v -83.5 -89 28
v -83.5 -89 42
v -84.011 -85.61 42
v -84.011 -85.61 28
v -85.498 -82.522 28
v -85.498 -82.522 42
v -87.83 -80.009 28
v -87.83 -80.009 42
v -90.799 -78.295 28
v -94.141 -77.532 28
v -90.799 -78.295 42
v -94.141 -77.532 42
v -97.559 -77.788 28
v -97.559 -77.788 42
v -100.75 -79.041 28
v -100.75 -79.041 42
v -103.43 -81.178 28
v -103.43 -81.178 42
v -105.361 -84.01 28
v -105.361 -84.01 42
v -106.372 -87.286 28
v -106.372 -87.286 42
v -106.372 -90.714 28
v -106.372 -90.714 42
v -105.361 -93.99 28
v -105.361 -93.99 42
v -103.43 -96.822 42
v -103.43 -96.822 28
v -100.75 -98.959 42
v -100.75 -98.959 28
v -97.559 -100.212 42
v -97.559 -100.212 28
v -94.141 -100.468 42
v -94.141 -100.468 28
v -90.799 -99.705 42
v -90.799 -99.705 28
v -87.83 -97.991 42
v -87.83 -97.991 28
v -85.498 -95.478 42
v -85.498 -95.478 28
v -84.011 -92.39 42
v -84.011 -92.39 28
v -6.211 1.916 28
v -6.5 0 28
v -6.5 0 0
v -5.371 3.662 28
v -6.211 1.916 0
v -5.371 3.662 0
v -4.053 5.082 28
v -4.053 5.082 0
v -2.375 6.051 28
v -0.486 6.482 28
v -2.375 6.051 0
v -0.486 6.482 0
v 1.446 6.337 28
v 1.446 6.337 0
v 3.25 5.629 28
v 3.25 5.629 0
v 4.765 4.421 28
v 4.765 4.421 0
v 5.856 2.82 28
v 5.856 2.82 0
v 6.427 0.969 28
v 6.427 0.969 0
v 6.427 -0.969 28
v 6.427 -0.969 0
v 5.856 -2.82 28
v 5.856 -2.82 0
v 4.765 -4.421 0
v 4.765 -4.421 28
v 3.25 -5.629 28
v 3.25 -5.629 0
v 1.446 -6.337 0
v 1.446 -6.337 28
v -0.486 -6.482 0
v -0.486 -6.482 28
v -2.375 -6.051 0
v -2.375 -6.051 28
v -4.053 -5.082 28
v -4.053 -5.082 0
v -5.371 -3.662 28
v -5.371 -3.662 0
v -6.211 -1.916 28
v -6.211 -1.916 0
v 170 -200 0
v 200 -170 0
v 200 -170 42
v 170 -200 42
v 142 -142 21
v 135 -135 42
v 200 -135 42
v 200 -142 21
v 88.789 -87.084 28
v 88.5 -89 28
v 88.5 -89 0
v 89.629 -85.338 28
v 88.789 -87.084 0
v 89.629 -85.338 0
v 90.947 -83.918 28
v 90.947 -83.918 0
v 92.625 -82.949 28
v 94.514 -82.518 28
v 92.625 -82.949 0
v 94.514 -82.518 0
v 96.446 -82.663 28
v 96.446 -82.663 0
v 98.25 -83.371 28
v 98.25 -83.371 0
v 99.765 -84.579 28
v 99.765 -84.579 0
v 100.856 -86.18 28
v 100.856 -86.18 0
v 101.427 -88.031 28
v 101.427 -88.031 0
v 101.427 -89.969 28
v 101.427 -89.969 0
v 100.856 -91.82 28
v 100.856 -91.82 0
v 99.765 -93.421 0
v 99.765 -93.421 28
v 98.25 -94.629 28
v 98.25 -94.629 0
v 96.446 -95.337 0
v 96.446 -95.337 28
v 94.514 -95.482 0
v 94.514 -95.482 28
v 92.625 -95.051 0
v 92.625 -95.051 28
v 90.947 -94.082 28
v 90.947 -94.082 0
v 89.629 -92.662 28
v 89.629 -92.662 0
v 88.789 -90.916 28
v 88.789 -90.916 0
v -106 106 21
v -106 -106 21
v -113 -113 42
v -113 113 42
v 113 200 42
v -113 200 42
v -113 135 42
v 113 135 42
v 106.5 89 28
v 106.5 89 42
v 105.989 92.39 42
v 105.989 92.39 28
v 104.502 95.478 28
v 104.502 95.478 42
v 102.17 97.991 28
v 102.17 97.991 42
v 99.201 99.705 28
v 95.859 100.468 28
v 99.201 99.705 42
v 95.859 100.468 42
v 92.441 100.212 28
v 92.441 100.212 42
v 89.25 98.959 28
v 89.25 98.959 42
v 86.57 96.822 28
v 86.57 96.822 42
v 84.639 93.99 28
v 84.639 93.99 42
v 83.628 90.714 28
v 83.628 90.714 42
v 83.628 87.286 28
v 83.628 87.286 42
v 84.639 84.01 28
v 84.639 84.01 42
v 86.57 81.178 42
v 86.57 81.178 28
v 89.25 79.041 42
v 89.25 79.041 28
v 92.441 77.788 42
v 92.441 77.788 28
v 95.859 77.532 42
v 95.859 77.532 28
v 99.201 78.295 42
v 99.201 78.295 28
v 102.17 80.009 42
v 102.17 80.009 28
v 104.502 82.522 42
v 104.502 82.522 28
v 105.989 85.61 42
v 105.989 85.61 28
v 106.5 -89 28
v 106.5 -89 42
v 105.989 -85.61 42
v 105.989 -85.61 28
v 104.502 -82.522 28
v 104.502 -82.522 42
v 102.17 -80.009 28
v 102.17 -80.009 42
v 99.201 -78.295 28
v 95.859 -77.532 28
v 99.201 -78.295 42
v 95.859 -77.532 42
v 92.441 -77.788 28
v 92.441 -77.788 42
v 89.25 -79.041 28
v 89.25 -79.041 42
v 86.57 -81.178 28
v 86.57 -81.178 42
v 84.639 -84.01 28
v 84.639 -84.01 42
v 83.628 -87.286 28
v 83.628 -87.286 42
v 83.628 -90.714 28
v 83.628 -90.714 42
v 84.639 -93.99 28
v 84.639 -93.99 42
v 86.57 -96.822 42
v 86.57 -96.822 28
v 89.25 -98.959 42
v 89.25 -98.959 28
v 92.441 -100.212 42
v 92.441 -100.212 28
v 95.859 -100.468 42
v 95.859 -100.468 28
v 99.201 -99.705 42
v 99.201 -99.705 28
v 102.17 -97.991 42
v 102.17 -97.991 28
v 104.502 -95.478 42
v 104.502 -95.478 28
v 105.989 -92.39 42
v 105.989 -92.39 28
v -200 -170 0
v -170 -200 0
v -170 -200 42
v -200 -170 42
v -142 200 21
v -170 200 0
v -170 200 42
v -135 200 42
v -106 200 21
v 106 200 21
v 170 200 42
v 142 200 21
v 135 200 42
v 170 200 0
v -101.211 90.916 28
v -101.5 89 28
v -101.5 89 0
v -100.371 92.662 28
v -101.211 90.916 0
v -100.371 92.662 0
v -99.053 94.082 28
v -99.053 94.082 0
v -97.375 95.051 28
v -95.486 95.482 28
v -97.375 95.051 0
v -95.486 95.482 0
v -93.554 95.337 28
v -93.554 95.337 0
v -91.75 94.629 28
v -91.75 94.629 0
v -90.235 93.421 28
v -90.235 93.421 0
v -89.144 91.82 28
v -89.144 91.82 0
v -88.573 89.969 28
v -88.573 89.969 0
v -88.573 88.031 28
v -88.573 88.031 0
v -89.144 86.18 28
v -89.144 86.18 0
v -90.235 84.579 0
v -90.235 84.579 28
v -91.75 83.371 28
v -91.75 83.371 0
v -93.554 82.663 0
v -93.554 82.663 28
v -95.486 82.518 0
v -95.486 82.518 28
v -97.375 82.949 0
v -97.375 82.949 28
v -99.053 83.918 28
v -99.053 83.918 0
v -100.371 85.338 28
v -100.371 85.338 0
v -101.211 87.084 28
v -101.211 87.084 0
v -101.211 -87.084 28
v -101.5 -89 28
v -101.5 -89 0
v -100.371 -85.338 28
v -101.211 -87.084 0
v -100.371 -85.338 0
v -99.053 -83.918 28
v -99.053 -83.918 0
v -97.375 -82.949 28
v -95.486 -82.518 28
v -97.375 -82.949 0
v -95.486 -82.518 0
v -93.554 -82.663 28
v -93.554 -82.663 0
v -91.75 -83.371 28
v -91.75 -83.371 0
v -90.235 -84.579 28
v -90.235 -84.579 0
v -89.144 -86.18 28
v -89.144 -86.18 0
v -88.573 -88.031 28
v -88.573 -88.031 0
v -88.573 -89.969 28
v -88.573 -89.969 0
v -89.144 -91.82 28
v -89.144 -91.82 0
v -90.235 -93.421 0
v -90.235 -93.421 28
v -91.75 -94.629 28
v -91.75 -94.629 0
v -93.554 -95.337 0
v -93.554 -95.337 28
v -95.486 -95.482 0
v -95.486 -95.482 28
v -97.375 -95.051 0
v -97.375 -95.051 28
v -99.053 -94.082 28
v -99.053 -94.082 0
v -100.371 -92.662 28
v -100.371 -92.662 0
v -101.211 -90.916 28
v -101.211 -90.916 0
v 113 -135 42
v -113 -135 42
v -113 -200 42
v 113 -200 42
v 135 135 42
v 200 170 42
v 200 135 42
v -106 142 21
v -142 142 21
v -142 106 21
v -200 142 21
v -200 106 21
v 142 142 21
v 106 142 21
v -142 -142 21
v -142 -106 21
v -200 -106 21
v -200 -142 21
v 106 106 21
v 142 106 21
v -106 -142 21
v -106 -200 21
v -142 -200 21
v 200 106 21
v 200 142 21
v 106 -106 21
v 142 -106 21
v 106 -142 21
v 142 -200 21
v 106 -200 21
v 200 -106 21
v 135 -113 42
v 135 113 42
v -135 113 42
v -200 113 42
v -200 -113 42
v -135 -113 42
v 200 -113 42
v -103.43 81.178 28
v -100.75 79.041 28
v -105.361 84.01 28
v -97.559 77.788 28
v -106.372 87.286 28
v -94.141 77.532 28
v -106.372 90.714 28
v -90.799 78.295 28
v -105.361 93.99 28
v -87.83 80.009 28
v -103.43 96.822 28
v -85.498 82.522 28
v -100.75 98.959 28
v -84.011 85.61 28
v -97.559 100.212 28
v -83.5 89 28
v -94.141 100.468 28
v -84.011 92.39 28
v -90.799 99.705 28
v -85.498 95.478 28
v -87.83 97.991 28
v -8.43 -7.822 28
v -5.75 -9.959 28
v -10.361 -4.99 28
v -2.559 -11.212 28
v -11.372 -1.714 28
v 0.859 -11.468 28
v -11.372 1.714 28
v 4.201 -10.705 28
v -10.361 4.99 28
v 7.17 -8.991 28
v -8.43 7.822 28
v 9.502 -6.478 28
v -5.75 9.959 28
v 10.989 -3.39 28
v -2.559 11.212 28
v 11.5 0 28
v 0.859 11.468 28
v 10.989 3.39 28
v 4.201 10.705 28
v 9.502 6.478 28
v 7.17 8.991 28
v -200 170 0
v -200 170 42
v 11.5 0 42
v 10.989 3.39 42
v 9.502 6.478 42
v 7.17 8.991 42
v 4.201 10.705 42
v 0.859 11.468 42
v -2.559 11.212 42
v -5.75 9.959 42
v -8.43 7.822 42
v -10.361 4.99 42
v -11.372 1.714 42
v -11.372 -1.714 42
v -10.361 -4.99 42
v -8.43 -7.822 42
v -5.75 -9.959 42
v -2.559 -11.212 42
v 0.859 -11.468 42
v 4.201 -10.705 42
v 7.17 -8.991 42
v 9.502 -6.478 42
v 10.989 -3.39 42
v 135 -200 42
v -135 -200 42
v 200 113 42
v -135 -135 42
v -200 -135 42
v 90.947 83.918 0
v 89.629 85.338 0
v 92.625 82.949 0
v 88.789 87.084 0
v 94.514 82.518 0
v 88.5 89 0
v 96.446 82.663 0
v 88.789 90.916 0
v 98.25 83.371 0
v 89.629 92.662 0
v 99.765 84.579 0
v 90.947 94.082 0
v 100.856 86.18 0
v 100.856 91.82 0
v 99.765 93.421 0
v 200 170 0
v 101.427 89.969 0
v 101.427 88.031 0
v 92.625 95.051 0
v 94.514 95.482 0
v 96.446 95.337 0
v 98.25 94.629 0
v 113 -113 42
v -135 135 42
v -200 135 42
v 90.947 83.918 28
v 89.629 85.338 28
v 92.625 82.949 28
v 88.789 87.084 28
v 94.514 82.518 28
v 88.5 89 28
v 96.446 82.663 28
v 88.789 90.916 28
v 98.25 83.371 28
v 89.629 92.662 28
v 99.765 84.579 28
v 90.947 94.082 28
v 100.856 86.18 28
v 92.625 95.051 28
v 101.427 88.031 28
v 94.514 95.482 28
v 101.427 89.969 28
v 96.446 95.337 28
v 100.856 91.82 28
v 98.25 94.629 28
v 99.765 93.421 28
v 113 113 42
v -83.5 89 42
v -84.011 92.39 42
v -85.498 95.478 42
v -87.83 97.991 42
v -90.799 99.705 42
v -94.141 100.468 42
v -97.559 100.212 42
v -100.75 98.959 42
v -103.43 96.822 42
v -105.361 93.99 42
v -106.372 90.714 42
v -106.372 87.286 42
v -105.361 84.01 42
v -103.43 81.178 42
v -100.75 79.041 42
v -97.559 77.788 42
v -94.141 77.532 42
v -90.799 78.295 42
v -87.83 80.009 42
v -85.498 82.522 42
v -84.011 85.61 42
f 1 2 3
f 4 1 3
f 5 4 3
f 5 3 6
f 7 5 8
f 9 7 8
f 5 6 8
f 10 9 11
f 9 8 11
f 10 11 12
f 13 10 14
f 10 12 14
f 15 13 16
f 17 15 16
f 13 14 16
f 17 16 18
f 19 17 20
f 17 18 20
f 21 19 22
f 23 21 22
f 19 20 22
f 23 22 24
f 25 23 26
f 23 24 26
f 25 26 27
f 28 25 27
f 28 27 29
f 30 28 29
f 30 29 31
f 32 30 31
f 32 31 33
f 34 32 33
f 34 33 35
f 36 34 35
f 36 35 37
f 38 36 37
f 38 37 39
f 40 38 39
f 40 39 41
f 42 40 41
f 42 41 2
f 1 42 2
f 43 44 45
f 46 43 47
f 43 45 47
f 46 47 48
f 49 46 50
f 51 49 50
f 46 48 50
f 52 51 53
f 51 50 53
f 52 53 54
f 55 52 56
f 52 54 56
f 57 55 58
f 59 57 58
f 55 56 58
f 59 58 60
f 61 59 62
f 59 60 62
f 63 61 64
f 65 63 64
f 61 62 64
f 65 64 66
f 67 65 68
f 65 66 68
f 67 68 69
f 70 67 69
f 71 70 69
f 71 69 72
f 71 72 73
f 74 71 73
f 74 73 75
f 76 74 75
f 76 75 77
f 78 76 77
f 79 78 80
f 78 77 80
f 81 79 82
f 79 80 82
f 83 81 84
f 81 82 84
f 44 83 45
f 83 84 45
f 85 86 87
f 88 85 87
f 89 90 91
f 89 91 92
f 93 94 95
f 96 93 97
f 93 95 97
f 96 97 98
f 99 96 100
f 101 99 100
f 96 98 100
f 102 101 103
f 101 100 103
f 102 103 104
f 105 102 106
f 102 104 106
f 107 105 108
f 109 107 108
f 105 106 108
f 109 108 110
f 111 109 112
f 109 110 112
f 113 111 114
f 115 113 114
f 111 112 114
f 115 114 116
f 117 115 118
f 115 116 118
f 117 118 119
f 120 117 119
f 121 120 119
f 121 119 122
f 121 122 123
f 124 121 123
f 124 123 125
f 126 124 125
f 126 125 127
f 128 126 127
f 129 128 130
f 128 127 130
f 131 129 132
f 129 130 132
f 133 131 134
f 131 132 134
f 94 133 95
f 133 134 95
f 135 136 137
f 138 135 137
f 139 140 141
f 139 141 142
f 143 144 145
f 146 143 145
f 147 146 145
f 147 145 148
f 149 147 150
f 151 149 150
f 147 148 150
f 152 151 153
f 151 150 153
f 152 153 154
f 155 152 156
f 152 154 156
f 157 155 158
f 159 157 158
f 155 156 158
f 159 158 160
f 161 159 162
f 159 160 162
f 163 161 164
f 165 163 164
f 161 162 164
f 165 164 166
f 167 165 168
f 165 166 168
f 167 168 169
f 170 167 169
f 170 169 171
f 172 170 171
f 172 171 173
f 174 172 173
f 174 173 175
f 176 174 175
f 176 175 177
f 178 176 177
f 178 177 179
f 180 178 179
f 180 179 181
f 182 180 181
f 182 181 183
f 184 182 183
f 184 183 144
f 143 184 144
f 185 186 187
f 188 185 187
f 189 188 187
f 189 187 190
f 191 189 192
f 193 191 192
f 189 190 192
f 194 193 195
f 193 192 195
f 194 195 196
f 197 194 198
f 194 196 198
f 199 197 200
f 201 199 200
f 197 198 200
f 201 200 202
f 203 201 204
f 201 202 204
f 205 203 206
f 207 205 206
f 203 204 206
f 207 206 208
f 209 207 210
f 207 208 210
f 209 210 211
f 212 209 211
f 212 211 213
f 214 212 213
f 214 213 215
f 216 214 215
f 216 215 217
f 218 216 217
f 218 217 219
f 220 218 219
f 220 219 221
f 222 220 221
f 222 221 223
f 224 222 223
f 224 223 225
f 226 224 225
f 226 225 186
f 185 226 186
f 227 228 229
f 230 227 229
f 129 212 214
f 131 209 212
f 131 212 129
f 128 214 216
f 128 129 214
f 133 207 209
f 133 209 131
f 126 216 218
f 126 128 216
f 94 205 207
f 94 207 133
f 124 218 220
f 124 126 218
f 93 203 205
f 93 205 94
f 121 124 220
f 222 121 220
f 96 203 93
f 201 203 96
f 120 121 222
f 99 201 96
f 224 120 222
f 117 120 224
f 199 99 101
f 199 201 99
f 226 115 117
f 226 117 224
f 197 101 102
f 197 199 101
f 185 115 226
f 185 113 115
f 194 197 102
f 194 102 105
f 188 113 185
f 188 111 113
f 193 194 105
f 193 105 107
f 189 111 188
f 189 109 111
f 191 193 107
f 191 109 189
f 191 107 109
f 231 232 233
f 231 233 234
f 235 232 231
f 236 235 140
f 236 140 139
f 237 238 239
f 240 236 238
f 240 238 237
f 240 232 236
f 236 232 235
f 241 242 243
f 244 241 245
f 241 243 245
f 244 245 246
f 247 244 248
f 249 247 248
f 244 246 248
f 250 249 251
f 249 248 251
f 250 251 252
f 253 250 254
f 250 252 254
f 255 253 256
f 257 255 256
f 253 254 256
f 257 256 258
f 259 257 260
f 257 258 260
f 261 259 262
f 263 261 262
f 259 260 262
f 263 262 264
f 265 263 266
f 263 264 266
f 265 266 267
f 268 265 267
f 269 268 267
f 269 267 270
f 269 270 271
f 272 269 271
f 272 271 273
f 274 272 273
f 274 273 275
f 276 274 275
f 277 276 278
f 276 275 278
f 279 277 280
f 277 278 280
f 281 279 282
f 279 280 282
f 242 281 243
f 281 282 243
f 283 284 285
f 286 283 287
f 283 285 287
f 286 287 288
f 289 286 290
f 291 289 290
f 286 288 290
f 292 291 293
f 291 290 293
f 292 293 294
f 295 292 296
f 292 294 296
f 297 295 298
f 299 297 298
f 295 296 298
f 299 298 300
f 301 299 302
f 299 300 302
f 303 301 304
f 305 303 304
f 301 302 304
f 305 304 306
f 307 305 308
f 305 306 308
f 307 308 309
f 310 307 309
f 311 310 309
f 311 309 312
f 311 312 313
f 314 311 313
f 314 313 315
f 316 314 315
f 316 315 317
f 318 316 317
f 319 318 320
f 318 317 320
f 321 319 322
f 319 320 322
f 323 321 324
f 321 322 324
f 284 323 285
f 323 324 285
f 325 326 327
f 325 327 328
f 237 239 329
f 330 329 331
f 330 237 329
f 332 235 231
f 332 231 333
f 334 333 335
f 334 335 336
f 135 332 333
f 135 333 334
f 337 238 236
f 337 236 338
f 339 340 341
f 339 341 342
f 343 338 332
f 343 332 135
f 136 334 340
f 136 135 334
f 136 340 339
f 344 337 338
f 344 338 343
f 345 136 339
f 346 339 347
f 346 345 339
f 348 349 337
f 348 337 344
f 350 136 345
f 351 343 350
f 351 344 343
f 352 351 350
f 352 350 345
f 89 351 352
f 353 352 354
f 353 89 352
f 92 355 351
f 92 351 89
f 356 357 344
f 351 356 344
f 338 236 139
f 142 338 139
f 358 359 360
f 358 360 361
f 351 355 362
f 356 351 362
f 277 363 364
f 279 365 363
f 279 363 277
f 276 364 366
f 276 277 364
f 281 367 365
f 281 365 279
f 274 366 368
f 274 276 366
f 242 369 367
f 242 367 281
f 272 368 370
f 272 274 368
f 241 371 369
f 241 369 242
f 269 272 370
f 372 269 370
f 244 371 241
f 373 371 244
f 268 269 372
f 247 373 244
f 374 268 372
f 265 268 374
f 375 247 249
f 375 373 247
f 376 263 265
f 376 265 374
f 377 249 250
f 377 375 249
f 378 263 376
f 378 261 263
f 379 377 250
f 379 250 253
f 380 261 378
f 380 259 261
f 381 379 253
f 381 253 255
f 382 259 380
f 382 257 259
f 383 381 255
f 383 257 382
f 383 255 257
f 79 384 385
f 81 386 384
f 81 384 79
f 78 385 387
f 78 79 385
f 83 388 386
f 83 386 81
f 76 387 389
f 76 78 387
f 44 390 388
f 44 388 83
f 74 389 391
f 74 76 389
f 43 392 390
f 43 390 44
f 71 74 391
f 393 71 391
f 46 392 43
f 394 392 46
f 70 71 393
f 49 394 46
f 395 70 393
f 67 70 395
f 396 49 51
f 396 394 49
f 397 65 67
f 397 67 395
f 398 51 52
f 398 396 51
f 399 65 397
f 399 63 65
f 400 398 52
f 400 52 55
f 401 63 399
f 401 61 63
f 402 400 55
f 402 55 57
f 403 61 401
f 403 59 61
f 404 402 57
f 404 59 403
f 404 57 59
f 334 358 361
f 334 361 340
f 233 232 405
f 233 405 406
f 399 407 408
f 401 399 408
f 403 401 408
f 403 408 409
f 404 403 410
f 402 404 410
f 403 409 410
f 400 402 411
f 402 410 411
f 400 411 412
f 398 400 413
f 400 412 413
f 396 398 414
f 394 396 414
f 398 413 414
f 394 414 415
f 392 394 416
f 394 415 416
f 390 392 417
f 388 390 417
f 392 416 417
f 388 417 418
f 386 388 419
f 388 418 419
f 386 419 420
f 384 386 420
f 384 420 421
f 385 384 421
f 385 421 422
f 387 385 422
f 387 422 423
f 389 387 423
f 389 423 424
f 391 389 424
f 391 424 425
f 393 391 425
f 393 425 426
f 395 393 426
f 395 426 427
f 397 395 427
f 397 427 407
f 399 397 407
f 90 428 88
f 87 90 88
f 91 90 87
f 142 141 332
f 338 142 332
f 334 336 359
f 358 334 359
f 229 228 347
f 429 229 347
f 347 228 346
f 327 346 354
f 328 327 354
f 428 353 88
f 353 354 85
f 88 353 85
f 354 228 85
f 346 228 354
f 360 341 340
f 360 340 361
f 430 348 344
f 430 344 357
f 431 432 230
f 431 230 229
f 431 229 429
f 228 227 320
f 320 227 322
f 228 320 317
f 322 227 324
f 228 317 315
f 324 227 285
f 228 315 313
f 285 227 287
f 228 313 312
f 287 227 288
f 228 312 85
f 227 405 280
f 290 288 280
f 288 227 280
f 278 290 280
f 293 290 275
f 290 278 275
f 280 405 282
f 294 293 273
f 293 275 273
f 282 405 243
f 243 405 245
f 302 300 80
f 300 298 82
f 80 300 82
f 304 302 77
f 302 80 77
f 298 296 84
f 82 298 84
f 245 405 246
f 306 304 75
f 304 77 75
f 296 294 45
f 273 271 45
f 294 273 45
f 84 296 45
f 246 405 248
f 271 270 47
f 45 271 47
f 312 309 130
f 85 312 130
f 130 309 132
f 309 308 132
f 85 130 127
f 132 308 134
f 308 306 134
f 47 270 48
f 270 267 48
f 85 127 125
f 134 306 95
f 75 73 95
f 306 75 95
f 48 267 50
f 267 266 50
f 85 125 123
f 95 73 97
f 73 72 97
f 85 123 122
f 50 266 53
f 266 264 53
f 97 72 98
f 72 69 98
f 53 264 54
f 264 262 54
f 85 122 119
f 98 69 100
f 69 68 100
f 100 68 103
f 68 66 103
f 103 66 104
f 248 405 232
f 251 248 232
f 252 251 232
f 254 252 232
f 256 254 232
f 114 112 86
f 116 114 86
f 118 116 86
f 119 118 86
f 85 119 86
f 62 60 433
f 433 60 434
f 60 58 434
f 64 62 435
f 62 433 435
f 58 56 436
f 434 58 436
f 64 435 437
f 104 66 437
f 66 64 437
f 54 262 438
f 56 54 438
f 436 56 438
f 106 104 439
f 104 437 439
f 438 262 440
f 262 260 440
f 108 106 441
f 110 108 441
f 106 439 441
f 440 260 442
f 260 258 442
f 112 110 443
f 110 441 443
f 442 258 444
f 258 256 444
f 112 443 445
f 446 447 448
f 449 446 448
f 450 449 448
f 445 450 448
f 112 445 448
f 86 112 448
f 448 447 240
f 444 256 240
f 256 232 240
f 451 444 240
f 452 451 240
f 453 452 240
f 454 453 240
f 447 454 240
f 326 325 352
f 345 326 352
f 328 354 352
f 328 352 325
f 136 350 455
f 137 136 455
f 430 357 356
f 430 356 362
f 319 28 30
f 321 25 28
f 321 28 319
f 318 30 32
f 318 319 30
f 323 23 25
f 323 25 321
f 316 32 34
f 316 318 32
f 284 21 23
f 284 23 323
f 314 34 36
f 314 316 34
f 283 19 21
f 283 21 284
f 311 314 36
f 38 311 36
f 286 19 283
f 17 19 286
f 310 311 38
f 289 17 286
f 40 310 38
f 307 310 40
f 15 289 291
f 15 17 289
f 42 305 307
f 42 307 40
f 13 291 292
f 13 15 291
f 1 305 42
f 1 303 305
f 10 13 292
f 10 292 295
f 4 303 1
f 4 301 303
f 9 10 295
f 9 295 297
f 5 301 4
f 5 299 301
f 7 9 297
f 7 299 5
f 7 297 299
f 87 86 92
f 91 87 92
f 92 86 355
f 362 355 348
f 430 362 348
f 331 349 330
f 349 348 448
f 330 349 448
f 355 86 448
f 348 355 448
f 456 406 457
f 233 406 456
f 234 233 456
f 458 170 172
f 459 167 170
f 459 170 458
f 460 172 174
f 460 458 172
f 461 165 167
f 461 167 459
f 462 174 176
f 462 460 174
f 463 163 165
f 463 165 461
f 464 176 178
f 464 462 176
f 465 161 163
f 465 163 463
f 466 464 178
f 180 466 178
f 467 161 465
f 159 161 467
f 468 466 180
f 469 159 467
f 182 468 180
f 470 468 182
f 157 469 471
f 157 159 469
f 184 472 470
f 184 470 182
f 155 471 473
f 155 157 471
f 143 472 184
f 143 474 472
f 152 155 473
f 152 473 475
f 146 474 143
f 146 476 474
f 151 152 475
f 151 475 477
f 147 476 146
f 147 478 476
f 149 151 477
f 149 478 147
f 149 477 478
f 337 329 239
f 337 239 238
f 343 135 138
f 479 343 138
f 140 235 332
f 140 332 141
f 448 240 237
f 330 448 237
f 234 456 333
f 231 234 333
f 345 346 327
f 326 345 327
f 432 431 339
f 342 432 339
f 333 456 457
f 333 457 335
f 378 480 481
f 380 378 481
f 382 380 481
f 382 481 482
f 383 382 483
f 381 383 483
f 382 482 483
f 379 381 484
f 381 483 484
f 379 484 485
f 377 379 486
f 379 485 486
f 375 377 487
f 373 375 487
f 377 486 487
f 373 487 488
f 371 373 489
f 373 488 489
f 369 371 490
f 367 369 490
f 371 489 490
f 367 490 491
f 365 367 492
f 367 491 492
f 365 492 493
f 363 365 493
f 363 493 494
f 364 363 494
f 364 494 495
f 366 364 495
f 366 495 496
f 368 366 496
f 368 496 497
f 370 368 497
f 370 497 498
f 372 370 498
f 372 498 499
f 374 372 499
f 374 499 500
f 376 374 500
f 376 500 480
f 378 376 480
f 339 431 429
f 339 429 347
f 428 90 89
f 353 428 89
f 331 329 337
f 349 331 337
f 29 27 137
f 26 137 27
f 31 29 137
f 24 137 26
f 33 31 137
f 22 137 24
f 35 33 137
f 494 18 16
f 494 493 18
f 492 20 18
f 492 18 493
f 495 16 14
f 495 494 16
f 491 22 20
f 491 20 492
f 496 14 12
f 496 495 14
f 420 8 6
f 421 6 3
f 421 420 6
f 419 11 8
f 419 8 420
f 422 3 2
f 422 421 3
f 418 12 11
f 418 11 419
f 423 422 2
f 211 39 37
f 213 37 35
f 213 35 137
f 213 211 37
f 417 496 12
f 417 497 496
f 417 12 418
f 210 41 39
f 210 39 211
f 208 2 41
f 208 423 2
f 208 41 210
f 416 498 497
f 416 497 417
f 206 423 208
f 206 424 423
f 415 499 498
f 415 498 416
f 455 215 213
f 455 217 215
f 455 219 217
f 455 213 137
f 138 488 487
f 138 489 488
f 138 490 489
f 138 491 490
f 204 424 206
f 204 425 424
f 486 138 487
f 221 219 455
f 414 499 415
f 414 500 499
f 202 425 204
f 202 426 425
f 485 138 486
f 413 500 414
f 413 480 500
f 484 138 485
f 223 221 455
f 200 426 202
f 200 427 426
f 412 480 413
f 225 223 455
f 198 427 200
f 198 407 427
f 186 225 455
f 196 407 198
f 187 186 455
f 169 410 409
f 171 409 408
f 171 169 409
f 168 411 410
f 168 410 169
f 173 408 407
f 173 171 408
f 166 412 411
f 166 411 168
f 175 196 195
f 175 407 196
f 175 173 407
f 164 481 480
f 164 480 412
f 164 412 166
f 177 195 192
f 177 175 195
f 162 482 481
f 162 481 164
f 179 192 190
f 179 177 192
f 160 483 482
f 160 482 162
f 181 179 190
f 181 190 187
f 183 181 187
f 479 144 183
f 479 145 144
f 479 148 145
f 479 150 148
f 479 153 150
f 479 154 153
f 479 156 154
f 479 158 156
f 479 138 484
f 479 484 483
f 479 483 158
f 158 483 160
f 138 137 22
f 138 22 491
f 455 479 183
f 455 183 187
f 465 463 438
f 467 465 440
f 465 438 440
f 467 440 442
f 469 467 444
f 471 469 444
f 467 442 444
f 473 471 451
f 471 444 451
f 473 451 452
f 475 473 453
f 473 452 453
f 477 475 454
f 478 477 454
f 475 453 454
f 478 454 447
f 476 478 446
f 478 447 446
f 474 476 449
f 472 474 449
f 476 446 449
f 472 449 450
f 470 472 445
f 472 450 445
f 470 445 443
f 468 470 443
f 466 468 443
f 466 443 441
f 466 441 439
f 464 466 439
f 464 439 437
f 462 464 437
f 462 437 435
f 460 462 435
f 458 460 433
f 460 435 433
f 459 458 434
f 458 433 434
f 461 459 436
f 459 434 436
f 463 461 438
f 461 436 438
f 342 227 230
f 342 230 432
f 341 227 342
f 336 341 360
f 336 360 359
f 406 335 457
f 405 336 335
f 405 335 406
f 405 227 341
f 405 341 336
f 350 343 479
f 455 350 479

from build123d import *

# Parameters (mm, degrees)
SKETCH_1_W                      = 400
SKETCH_1_H                      = 400
EXTRUDE_1_DEPTH                 = 42
CHAMFER_1_SIZE                  = 30
CUT_EXTRUDE_1_DEPTH             = 450.181477802
PATTERN_CIRCULAR_1_COPY_1_DEPTH = 450.181477802
PATTERN_CIRCULAR_1_COPY_2_DEPTH = 450.181477802
HOLE_WIZARD_1_D                 = 13
HOLE_WIZARD_1_CBORE_D           = 23
HOLE_WIZARD_1_CBORE_DEPTH       = 14


with BuildPart() as part:
    # 草图1 → 凸台-拉伸1 (new body)
    with BuildSketch(Plane.XY):
        Rectangle(SKETCH_1_W, SKETCH_1_H)
    extrude(amount=EXTRUDE_1_DEPTH)

    # 倒角1
    chamfer_1_edges = [part.edges().sort_by_distance(p)[0] for p in [
        (-200, -200, 21),
        (-200, 200, 21),
        (200, 200, 21),
        (200, -200, 21),
    ]]
    chamfer(chamfer_1_edges, length=CHAMFER_1_SIZE)

    # 草图2 → 切除-拉伸1 (cut, symmetric)
    with BuildSketch(Plane.XZ.offset(200)):
        Polygon((-142, 21), (-106, 21), (-113, 42), (-135, 42), align=None)
    cut_extrude_1 = extrude(amount=CUT_EXTRUDE_1_DEPTH, both=True, mode=Mode.SUBTRACT)

    # 镜向1: 切除-拉伸1 across plane
    add(cut_extrude_1.mirror(Plane(origin=(0, 0, 0), x_dir=(0, 0, 1), z_dir=(1, 0, 0))), mode=Mode.SUBTRACT)

    # 阵列(圆周)1 copy 1 sketch → 阵列(圆周)1 copy 1 (cut, symmetric)
    with BuildSketch(Plane(origin=(200, 0, 0), x_dir=(0, -1, 0), z_dir=(1, 0, 0))):
        Polygon((-142, -21), (-106, -21), (-113, -42), (-135, -42), align=None)
    extrude(amount=PATTERN_CIRCULAR_1_COPY_1_DEPTH, both=True, mode=Mode.SUBTRACT)

    # 阵列(圆周)1 copy 2 sketch → 阵列(圆周)1 copy 2 (cut, symmetric)
    with BuildSketch(Plane.YZ.offset(200)):
        Polygon((-142, 21), (-106, 21), (-113, 42), (-135, 42), align=None)
    extrude(amount=PATTERN_CIRCULAR_1_COPY_2_DEPTH, both=True, mode=Mode.SUBTRACT)

    # 孔1 (through all)
    with Locations(Plane.XY.offset(42)):
        with Locations((0, 0), (95, 89), (95, -89), (-95, -89), (-95, 89)):
            CounterBoreHole(HOLE_WIZARD_1_D / 2, HOLE_WIZARD_1_CBORE_D / 2, HOLE_WIZARD_1_CBORE_DEPTH)


solid = part.part
